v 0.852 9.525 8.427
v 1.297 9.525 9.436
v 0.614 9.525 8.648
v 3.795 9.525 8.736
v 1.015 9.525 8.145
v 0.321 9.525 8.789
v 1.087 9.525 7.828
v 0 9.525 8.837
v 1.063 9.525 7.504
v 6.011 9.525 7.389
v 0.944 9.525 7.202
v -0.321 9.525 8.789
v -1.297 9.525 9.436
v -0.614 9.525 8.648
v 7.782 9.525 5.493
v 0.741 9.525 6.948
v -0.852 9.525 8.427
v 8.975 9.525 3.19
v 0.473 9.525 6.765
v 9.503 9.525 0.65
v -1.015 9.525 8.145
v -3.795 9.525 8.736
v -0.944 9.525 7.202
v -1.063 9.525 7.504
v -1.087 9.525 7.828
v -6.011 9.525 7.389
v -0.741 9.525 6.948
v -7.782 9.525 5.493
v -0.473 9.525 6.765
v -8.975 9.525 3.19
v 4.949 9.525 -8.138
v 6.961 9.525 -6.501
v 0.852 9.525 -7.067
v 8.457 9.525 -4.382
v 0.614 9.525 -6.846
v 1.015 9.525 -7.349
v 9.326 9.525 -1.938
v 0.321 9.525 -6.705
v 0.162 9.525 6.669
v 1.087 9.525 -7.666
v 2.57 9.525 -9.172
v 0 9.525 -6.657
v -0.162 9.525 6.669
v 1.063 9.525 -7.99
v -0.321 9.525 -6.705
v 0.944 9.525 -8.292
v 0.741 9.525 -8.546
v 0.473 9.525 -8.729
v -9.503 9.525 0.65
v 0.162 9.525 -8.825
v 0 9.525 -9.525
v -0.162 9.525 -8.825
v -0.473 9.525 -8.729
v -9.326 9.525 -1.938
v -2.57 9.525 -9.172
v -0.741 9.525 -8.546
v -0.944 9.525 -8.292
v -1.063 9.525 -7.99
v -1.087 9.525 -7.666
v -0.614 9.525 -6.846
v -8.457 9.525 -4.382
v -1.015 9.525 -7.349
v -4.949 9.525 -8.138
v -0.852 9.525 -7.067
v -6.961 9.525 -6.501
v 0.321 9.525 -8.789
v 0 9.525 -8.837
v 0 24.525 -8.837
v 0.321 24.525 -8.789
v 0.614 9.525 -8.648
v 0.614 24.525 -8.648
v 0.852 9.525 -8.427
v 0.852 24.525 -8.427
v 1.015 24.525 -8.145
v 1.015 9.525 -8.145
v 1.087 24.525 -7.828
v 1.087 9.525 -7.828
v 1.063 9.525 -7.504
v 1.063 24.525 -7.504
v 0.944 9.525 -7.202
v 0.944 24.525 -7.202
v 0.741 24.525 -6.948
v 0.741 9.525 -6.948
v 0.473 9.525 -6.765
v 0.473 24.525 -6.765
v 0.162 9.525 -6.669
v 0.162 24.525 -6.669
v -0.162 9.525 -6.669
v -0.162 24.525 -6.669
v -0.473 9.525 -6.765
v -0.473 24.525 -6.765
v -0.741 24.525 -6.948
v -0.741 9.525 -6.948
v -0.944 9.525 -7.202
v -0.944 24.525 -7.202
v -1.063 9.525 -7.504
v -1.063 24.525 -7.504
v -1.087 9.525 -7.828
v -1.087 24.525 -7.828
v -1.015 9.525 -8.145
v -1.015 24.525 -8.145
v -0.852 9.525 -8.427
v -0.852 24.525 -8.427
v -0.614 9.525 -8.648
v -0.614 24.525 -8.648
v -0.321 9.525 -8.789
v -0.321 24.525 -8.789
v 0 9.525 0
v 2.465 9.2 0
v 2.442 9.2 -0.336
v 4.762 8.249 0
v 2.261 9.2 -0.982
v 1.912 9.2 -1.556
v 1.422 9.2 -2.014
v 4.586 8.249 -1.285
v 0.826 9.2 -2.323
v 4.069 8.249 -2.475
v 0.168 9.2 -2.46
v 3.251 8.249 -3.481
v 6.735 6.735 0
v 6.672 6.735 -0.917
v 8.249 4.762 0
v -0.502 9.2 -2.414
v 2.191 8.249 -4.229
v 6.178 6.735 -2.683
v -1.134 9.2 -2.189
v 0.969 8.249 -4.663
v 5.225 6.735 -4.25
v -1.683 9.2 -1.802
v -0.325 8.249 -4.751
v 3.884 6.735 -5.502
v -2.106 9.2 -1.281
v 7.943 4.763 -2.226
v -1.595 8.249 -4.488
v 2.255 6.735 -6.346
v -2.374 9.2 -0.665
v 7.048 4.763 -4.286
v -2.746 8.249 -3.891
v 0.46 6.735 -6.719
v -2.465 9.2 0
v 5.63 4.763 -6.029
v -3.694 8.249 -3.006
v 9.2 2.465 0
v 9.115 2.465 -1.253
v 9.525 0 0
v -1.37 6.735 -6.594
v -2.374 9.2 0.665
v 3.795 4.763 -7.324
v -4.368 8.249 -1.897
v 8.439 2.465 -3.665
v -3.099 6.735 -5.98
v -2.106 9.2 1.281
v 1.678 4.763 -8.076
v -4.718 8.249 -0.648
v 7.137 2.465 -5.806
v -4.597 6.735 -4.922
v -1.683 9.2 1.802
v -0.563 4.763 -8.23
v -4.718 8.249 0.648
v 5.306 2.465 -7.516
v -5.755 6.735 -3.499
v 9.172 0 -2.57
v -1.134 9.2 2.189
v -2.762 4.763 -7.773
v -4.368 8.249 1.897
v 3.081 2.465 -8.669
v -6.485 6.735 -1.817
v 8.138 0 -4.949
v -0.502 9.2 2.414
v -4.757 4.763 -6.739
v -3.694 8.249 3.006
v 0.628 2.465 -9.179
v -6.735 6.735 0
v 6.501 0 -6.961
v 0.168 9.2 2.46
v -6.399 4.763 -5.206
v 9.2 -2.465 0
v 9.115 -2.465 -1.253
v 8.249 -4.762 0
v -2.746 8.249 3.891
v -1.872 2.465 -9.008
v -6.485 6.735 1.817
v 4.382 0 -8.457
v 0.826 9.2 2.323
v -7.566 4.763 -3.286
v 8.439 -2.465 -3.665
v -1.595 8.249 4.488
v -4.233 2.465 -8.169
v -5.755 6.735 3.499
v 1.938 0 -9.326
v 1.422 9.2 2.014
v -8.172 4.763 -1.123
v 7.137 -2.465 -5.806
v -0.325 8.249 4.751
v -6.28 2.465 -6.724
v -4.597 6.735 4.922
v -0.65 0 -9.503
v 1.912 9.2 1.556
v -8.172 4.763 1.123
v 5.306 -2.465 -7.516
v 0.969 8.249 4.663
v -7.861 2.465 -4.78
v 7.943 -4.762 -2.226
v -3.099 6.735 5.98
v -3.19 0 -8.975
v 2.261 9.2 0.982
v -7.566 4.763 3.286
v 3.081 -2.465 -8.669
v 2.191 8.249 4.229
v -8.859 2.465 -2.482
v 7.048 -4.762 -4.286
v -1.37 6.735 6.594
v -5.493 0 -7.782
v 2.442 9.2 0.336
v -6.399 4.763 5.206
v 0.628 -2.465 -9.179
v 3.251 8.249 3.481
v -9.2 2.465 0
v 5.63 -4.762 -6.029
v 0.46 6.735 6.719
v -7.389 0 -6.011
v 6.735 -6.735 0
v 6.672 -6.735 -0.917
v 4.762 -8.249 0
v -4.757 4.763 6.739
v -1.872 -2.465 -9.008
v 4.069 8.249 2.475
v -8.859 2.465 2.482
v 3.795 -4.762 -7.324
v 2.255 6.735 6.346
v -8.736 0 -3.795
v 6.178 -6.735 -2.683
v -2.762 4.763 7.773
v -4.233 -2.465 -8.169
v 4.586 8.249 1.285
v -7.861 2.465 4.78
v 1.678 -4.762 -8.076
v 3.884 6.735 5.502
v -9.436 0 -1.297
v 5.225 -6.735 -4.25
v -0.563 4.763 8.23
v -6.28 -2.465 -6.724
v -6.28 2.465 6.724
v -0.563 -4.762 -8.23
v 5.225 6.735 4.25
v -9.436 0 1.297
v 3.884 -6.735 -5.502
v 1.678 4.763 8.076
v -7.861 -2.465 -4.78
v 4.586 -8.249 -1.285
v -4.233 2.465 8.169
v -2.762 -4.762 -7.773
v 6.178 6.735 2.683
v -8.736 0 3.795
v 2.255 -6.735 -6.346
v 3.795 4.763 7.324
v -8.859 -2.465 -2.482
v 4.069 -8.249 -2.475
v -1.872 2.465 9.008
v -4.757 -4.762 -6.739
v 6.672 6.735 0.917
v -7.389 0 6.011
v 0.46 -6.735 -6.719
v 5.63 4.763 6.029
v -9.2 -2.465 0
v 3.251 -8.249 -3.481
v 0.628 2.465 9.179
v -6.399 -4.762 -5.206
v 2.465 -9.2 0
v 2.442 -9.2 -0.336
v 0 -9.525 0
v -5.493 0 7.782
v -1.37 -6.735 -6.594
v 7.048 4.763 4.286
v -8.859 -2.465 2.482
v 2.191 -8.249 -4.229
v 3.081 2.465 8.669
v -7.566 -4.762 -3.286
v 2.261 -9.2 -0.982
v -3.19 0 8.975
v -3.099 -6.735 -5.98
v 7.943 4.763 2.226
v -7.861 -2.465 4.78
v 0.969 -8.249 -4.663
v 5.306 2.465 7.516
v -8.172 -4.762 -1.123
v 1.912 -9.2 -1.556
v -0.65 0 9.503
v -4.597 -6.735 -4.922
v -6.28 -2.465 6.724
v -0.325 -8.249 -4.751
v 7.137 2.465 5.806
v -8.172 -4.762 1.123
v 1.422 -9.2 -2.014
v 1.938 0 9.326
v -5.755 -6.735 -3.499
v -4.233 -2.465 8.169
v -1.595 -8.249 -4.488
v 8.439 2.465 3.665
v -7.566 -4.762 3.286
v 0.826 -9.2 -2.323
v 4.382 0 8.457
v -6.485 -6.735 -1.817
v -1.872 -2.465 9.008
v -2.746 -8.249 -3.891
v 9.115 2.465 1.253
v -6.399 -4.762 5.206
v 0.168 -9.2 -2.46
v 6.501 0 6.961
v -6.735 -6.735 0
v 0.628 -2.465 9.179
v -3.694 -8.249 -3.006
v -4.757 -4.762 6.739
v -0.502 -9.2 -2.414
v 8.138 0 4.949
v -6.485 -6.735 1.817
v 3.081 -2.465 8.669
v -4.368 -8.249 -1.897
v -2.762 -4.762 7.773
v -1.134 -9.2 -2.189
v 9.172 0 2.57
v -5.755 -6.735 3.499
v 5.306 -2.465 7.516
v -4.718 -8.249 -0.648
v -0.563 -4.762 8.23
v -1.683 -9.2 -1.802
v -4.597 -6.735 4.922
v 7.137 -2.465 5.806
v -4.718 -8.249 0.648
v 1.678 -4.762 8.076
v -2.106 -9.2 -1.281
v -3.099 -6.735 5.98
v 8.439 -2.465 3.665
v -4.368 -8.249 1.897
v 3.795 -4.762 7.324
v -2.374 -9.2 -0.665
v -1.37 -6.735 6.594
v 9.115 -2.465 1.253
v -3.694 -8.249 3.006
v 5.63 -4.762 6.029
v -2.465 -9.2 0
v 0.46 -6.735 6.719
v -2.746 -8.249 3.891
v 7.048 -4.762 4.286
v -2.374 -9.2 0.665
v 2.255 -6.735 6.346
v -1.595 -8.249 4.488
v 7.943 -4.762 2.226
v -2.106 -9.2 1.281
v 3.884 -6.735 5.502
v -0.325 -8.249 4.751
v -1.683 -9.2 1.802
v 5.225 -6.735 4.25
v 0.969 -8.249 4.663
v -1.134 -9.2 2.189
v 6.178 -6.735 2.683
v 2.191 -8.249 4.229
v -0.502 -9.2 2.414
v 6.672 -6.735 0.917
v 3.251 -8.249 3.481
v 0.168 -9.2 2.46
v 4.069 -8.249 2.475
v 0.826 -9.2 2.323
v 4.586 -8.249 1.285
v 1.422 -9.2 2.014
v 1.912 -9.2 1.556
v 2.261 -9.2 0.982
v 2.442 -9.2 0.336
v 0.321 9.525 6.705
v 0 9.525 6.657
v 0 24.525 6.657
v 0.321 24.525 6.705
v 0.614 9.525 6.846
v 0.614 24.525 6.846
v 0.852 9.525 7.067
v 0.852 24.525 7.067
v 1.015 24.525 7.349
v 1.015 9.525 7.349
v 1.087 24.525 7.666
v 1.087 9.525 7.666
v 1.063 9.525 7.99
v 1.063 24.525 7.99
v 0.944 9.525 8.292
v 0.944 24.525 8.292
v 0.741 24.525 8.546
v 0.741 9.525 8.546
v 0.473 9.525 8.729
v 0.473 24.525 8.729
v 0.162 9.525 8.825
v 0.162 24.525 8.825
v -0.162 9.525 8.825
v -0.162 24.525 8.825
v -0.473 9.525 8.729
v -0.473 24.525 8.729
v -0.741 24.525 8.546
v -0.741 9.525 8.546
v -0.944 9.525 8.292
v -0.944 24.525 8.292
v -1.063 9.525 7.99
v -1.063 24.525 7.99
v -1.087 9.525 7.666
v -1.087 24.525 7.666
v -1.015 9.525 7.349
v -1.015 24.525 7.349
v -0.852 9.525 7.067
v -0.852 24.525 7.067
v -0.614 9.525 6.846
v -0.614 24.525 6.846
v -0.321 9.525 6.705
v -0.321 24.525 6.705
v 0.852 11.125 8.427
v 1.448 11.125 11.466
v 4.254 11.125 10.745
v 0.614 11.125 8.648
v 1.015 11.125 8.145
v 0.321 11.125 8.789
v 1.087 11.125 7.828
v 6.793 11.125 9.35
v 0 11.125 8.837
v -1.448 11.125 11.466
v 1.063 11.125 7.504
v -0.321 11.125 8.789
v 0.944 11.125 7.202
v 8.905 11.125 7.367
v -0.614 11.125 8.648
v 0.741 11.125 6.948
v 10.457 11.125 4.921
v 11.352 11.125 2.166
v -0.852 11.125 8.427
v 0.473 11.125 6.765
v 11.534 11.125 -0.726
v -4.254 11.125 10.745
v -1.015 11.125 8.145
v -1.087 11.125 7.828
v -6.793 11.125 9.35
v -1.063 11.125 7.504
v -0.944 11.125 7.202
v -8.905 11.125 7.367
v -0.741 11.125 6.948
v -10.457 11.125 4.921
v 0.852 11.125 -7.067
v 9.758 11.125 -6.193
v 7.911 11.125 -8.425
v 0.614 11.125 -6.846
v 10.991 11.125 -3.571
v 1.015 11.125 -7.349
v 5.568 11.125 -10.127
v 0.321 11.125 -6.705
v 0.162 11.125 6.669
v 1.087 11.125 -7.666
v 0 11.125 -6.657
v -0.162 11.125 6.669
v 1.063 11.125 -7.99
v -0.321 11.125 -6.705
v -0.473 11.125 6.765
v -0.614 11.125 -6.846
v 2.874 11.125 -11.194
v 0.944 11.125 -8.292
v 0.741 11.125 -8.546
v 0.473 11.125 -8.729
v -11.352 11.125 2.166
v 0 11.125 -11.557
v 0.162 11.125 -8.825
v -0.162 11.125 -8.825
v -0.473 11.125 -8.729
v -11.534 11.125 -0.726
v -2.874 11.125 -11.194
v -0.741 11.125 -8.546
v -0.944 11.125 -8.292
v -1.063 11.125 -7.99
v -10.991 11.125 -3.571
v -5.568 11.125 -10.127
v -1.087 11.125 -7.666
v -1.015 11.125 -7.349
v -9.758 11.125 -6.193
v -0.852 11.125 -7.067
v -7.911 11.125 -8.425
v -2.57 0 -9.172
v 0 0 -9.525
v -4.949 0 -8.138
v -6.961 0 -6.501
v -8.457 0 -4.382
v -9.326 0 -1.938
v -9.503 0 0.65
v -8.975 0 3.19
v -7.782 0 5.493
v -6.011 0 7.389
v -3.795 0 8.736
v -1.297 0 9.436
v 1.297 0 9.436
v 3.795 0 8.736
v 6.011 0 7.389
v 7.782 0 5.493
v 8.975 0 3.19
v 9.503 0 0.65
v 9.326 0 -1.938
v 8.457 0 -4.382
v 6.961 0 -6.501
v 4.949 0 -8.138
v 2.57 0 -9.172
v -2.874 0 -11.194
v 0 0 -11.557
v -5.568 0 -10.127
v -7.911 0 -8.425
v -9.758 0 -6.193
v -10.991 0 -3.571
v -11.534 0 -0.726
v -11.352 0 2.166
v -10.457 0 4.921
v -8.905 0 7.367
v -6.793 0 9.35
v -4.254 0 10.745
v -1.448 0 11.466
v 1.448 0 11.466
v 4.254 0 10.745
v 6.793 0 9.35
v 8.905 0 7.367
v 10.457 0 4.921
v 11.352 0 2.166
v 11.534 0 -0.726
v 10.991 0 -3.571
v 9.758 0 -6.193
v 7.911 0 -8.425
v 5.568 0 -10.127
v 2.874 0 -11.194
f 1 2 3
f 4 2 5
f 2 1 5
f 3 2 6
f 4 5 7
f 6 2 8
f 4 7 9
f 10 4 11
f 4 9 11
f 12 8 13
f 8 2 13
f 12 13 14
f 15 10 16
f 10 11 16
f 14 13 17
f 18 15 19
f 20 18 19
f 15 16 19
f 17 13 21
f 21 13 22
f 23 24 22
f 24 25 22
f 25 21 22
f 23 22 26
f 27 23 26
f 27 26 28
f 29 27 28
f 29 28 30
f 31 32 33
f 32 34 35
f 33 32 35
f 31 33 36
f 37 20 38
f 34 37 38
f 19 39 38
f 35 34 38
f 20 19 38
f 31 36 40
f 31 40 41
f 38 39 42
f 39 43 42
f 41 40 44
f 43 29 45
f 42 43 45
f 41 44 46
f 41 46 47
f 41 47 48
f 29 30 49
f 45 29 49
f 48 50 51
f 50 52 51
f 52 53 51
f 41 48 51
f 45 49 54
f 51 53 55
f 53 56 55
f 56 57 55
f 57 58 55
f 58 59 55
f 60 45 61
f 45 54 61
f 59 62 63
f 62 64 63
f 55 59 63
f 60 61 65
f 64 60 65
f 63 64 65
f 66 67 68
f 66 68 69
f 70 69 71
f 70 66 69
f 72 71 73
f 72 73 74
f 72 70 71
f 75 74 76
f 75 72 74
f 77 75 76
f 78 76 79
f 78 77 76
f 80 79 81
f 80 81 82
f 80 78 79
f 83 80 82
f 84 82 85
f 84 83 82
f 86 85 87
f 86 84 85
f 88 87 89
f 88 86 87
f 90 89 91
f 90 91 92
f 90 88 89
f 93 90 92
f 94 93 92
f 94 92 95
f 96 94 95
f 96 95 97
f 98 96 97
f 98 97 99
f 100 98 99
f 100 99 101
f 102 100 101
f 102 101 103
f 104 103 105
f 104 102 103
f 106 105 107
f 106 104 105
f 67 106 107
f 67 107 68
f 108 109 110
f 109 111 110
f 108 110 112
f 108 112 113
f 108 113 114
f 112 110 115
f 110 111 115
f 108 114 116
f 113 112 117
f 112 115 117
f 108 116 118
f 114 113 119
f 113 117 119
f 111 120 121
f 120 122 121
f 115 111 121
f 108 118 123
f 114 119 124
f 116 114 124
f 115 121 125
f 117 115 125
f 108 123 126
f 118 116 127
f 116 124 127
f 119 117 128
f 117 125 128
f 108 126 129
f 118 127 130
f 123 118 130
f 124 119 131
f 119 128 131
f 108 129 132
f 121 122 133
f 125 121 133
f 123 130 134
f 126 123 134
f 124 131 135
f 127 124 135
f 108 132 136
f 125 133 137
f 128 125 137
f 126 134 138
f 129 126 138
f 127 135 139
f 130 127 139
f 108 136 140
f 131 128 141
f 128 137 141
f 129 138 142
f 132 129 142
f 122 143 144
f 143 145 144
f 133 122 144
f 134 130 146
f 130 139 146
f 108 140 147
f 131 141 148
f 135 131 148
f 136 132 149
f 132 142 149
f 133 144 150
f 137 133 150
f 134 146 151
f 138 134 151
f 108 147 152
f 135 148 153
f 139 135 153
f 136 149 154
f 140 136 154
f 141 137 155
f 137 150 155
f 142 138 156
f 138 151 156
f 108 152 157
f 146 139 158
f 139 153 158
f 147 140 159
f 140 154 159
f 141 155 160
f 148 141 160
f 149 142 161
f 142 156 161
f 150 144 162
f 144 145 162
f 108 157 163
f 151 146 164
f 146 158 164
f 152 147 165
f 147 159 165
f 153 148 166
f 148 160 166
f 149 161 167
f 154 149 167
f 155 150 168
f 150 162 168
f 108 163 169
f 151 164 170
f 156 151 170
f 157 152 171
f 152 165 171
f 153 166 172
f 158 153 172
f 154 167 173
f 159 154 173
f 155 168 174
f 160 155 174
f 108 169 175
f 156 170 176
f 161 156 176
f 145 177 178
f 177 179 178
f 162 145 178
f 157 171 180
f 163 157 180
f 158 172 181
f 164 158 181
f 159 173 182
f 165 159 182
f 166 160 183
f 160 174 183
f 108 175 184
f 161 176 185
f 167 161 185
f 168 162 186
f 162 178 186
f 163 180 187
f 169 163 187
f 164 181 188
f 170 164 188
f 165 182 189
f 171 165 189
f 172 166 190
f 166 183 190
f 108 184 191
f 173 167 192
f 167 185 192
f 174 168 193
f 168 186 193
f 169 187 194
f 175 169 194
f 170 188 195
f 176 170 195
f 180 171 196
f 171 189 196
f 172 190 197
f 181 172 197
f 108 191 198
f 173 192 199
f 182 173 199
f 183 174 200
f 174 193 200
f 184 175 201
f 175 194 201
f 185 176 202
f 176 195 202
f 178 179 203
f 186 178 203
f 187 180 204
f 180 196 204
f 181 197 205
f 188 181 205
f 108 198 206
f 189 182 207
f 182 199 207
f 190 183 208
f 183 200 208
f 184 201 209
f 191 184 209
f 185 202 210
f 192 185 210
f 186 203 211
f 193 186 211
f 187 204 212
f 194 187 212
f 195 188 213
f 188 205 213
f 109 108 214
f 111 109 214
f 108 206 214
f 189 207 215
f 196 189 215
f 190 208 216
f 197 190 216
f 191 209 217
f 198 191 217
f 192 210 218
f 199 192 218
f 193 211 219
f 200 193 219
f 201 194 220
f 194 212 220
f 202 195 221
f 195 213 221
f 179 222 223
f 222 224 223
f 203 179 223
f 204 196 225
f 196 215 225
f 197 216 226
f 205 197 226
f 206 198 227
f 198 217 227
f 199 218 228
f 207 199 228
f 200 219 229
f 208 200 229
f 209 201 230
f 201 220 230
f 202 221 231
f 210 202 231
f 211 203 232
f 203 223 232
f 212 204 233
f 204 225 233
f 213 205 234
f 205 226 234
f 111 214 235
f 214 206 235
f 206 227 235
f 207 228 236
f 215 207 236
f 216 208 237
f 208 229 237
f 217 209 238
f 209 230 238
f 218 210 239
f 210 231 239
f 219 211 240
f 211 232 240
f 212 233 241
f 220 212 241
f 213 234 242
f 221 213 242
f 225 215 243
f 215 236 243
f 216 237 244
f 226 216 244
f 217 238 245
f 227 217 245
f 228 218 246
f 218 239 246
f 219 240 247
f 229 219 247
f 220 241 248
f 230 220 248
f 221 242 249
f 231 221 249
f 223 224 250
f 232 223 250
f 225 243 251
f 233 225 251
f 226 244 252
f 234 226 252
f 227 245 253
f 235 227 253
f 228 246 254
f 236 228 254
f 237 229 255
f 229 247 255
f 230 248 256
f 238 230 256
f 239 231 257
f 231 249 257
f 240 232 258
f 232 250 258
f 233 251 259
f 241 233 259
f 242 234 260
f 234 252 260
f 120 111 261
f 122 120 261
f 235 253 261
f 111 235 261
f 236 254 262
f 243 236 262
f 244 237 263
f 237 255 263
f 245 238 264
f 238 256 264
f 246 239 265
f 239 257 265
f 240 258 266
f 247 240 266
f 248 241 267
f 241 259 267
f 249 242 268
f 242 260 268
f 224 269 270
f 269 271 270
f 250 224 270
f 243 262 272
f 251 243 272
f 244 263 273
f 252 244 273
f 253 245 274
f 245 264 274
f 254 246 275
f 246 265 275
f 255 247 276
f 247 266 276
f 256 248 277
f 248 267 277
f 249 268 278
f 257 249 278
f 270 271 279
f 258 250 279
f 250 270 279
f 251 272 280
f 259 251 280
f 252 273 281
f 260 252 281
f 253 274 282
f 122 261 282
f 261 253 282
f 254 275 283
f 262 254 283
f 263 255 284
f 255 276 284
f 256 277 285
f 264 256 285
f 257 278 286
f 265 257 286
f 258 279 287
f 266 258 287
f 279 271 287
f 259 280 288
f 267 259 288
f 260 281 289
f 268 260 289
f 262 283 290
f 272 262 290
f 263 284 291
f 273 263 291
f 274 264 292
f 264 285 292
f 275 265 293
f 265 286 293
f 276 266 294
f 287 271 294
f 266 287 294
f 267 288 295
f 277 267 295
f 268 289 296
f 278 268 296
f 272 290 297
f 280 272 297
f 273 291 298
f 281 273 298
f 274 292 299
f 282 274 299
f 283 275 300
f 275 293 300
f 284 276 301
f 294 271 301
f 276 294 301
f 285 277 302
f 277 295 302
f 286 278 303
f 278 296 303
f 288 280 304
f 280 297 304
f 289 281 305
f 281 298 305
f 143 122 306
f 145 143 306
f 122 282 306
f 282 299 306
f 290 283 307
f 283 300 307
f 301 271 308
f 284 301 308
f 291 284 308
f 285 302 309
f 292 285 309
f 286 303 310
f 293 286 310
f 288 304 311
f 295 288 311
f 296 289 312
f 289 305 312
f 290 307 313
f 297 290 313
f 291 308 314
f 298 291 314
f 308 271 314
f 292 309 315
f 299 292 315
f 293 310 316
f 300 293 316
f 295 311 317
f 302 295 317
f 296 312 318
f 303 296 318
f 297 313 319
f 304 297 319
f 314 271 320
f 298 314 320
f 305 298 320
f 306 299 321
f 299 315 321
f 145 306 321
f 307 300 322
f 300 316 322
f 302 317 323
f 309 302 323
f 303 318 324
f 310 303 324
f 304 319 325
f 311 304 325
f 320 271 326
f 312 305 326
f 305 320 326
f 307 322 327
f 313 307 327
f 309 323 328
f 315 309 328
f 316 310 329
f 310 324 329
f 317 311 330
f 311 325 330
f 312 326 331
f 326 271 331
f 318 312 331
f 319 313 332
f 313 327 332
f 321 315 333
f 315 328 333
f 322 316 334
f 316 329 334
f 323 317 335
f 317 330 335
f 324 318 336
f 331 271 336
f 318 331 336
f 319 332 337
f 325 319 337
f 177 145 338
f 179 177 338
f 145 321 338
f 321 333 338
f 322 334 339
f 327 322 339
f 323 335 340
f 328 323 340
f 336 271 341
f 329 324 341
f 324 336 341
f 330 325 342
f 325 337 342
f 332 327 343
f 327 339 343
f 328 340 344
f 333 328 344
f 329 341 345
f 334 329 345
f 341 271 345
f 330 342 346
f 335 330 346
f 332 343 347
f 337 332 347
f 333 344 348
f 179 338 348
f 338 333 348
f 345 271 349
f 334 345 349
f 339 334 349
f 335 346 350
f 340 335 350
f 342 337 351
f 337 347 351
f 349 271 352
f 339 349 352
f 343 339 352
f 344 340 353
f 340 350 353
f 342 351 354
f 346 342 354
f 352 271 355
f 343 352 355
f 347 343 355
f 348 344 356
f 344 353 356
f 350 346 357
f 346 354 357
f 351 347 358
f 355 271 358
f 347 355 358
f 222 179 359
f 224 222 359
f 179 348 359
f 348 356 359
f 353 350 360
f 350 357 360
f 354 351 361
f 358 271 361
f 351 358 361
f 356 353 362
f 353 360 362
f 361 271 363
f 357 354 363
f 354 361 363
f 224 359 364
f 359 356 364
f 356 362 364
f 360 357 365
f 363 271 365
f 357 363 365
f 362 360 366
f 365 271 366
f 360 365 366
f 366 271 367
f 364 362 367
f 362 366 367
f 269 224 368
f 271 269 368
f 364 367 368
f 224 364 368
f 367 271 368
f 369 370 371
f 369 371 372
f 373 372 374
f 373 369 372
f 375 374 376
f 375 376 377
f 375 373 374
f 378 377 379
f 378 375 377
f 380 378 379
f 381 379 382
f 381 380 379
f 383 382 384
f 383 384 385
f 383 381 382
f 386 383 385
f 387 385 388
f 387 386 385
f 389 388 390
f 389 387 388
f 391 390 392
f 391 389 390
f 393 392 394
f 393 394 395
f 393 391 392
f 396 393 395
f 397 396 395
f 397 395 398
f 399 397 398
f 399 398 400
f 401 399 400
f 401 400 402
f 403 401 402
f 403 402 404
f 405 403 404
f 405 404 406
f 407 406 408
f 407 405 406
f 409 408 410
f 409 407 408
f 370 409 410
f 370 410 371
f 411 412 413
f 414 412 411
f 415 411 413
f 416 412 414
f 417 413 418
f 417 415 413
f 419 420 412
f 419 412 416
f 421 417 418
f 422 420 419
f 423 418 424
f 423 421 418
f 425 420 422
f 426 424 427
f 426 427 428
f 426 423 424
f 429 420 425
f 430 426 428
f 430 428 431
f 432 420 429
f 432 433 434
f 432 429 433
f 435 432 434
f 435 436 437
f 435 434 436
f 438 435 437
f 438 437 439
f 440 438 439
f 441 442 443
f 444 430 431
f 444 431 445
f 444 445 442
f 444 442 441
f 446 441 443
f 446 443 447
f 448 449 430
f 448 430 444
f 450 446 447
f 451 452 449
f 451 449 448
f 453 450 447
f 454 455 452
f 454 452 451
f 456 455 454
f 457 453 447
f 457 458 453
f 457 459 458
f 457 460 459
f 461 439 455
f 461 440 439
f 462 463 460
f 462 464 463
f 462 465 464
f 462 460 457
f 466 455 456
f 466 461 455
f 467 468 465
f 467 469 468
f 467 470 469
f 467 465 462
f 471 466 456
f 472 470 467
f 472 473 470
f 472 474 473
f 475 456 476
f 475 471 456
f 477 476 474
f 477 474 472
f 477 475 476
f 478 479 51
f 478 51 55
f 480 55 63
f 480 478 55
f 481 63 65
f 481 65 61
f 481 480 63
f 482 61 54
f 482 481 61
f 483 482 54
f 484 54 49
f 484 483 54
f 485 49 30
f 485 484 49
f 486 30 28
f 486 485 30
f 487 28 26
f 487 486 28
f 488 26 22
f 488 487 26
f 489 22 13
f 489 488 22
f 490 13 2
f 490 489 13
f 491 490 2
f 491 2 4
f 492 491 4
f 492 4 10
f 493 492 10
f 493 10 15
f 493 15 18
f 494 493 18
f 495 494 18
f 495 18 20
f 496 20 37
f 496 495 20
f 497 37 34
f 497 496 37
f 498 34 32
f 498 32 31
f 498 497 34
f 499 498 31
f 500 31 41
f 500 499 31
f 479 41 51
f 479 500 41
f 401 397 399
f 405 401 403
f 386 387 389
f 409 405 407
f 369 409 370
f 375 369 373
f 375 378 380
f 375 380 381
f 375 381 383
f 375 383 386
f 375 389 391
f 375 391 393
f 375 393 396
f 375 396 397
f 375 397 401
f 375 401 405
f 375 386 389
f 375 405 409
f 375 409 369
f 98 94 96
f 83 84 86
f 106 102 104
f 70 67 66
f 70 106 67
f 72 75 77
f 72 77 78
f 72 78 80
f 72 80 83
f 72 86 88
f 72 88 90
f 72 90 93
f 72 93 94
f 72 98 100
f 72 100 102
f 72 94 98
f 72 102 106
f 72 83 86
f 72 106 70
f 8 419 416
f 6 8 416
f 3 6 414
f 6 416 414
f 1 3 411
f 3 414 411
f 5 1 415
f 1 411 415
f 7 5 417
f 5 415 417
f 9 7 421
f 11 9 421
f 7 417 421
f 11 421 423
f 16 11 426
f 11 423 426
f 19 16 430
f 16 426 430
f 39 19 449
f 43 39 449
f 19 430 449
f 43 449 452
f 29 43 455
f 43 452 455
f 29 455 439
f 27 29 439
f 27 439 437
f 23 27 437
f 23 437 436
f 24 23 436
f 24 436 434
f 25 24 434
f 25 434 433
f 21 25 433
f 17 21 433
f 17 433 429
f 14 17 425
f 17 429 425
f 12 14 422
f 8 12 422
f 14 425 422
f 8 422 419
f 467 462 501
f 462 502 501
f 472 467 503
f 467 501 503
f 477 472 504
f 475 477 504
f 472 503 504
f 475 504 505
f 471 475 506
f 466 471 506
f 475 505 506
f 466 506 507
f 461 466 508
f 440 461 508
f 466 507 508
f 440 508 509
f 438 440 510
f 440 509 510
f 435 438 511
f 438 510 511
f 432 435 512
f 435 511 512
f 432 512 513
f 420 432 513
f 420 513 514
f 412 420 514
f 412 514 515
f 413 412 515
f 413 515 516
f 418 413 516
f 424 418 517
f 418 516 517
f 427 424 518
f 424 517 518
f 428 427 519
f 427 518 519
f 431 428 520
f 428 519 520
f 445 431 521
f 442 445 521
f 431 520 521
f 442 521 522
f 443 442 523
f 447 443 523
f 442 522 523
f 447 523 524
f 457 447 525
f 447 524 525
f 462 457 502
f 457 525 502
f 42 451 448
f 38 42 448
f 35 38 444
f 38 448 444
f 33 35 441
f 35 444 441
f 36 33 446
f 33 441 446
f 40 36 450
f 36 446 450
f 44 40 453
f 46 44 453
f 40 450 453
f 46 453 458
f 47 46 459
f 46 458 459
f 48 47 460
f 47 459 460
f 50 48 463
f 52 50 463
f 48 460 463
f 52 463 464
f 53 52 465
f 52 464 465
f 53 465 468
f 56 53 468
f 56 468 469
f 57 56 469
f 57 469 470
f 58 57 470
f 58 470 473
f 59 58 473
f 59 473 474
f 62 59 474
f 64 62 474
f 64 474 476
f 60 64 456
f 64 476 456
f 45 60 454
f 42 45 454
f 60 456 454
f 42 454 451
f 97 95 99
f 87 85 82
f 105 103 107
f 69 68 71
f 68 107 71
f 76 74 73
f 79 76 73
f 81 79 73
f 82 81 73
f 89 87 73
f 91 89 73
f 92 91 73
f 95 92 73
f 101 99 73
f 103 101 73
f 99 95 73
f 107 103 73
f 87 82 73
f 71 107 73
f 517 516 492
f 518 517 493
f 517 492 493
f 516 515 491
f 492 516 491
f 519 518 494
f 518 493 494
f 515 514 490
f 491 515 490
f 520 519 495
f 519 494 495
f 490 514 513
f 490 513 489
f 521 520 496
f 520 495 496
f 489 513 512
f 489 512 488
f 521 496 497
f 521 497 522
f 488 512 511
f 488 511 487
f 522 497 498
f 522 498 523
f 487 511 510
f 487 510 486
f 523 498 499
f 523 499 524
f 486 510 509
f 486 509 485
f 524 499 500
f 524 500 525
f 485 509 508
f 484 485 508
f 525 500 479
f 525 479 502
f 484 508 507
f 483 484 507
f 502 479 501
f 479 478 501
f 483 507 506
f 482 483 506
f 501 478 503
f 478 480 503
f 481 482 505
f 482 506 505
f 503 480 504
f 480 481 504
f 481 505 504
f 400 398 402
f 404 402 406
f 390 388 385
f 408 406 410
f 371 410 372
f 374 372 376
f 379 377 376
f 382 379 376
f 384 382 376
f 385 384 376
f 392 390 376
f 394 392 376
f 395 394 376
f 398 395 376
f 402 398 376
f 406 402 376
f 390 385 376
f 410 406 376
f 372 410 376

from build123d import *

# Parameters (mm, degrees)
SKETCH2_R          = 11.557
SKETCH2_R_2        = 9.525
HOUSING_PT_1_DEPTH = 9.525
SKETCH3_R          = 11.557
HOUSING_PT_2_DEPTH = 1.6
SKETCH4_R          = 1.09
SCREW_HOLES_DEPTH  = 1.6
SKETCH5_R          = 1.09
SCREWS_DEPTH       = 15
SCREWS_2_DEPTH     = 15


with BuildPart() as part:
    # Sketch1 → Metal Ball 3/4" (revolve)
    with BuildSketch(Plane.XY):
        with BuildLine():
            Line((0, -9.525), (0, 9.525))
            ThreePointArc((0, 9.525), (9.525, 0), (0, -9.525))
        make_face()
    revolve(axis=Axis((0, -9.525, 0), (0, 1, 0)))


with BuildPart() as body_2:
    # Sketch2 → Housing Pt. 1 (new body)
    with BuildSketch(Plane(origin=(0, 0, 0), x_dir=(1, 0, 0), z_dir=(0, 1, 0))):
        with Locations(Location((0, 0, 0), (0, 0, 90))):
            Circle(SKETCH2_R)
        with Locations(Location((0, 0, 0), (0, 0, 90))):
            Circle(SKETCH2_R_2, mode=Mode.SUBTRACT)
    extrude(amount=HOUSING_PT_1_DEPTH)

    # Sketch3 → Housing Pt. 2 (add)
    with BuildSketch(Plane(origin=(0, 9.525, 0), x_dir=(1, 0, 0), z_dir=(0, 1, 0))):
        with Locations(Location((0, 0, 0), (0, 0, 90))):
            Circle(SKETCH3_R)
    extrude(amount=HOUSING_PT_2_DEPTH)

    # Sketch4 → Screw Holes (cut)
    with BuildSketch(Plane(origin=(0, 11.125, 0), x_dir=(1, 0, 0), z_dir=(0, 1, 0))):
        with Locations(Location((0, 7.747, 0), (0, 0, 270))):
            Circle(SKETCH4_R)
        with Locations(Location((0, -7.747, 0), (0, 0, 270))):
            Circle(SKETCH4_R)
    extrude(amount=-SCREW_HOLES_DEPTH, mode=Mode.SUBTRACT)


with BuildPart() as body_3:
    # Sketch5 → Screws (new body)
    with BuildSketch(Plane.XZ.offset(-9.525)):
        with Locations(Location((0, 7.747, 0), (0, 0, 270))):
            Circle(SKETCH5_R)
    extrude(amount=-SCREWS_DEPTH)


with BuildPart() as body_4:
    # Sketch5 → Screws 2 (new body)
    with BuildSketch(Plane.XZ.offset(-9.525)):
        with Locations(Location((0, -7.747, 0), (0, 0, 270))):
            Circle(SKETCH5_R)
    extrude(amount=-SCREWS_2_DEPTH)


solid = Compound([part.part, body_2.part, body_3.part, body_4.part])
